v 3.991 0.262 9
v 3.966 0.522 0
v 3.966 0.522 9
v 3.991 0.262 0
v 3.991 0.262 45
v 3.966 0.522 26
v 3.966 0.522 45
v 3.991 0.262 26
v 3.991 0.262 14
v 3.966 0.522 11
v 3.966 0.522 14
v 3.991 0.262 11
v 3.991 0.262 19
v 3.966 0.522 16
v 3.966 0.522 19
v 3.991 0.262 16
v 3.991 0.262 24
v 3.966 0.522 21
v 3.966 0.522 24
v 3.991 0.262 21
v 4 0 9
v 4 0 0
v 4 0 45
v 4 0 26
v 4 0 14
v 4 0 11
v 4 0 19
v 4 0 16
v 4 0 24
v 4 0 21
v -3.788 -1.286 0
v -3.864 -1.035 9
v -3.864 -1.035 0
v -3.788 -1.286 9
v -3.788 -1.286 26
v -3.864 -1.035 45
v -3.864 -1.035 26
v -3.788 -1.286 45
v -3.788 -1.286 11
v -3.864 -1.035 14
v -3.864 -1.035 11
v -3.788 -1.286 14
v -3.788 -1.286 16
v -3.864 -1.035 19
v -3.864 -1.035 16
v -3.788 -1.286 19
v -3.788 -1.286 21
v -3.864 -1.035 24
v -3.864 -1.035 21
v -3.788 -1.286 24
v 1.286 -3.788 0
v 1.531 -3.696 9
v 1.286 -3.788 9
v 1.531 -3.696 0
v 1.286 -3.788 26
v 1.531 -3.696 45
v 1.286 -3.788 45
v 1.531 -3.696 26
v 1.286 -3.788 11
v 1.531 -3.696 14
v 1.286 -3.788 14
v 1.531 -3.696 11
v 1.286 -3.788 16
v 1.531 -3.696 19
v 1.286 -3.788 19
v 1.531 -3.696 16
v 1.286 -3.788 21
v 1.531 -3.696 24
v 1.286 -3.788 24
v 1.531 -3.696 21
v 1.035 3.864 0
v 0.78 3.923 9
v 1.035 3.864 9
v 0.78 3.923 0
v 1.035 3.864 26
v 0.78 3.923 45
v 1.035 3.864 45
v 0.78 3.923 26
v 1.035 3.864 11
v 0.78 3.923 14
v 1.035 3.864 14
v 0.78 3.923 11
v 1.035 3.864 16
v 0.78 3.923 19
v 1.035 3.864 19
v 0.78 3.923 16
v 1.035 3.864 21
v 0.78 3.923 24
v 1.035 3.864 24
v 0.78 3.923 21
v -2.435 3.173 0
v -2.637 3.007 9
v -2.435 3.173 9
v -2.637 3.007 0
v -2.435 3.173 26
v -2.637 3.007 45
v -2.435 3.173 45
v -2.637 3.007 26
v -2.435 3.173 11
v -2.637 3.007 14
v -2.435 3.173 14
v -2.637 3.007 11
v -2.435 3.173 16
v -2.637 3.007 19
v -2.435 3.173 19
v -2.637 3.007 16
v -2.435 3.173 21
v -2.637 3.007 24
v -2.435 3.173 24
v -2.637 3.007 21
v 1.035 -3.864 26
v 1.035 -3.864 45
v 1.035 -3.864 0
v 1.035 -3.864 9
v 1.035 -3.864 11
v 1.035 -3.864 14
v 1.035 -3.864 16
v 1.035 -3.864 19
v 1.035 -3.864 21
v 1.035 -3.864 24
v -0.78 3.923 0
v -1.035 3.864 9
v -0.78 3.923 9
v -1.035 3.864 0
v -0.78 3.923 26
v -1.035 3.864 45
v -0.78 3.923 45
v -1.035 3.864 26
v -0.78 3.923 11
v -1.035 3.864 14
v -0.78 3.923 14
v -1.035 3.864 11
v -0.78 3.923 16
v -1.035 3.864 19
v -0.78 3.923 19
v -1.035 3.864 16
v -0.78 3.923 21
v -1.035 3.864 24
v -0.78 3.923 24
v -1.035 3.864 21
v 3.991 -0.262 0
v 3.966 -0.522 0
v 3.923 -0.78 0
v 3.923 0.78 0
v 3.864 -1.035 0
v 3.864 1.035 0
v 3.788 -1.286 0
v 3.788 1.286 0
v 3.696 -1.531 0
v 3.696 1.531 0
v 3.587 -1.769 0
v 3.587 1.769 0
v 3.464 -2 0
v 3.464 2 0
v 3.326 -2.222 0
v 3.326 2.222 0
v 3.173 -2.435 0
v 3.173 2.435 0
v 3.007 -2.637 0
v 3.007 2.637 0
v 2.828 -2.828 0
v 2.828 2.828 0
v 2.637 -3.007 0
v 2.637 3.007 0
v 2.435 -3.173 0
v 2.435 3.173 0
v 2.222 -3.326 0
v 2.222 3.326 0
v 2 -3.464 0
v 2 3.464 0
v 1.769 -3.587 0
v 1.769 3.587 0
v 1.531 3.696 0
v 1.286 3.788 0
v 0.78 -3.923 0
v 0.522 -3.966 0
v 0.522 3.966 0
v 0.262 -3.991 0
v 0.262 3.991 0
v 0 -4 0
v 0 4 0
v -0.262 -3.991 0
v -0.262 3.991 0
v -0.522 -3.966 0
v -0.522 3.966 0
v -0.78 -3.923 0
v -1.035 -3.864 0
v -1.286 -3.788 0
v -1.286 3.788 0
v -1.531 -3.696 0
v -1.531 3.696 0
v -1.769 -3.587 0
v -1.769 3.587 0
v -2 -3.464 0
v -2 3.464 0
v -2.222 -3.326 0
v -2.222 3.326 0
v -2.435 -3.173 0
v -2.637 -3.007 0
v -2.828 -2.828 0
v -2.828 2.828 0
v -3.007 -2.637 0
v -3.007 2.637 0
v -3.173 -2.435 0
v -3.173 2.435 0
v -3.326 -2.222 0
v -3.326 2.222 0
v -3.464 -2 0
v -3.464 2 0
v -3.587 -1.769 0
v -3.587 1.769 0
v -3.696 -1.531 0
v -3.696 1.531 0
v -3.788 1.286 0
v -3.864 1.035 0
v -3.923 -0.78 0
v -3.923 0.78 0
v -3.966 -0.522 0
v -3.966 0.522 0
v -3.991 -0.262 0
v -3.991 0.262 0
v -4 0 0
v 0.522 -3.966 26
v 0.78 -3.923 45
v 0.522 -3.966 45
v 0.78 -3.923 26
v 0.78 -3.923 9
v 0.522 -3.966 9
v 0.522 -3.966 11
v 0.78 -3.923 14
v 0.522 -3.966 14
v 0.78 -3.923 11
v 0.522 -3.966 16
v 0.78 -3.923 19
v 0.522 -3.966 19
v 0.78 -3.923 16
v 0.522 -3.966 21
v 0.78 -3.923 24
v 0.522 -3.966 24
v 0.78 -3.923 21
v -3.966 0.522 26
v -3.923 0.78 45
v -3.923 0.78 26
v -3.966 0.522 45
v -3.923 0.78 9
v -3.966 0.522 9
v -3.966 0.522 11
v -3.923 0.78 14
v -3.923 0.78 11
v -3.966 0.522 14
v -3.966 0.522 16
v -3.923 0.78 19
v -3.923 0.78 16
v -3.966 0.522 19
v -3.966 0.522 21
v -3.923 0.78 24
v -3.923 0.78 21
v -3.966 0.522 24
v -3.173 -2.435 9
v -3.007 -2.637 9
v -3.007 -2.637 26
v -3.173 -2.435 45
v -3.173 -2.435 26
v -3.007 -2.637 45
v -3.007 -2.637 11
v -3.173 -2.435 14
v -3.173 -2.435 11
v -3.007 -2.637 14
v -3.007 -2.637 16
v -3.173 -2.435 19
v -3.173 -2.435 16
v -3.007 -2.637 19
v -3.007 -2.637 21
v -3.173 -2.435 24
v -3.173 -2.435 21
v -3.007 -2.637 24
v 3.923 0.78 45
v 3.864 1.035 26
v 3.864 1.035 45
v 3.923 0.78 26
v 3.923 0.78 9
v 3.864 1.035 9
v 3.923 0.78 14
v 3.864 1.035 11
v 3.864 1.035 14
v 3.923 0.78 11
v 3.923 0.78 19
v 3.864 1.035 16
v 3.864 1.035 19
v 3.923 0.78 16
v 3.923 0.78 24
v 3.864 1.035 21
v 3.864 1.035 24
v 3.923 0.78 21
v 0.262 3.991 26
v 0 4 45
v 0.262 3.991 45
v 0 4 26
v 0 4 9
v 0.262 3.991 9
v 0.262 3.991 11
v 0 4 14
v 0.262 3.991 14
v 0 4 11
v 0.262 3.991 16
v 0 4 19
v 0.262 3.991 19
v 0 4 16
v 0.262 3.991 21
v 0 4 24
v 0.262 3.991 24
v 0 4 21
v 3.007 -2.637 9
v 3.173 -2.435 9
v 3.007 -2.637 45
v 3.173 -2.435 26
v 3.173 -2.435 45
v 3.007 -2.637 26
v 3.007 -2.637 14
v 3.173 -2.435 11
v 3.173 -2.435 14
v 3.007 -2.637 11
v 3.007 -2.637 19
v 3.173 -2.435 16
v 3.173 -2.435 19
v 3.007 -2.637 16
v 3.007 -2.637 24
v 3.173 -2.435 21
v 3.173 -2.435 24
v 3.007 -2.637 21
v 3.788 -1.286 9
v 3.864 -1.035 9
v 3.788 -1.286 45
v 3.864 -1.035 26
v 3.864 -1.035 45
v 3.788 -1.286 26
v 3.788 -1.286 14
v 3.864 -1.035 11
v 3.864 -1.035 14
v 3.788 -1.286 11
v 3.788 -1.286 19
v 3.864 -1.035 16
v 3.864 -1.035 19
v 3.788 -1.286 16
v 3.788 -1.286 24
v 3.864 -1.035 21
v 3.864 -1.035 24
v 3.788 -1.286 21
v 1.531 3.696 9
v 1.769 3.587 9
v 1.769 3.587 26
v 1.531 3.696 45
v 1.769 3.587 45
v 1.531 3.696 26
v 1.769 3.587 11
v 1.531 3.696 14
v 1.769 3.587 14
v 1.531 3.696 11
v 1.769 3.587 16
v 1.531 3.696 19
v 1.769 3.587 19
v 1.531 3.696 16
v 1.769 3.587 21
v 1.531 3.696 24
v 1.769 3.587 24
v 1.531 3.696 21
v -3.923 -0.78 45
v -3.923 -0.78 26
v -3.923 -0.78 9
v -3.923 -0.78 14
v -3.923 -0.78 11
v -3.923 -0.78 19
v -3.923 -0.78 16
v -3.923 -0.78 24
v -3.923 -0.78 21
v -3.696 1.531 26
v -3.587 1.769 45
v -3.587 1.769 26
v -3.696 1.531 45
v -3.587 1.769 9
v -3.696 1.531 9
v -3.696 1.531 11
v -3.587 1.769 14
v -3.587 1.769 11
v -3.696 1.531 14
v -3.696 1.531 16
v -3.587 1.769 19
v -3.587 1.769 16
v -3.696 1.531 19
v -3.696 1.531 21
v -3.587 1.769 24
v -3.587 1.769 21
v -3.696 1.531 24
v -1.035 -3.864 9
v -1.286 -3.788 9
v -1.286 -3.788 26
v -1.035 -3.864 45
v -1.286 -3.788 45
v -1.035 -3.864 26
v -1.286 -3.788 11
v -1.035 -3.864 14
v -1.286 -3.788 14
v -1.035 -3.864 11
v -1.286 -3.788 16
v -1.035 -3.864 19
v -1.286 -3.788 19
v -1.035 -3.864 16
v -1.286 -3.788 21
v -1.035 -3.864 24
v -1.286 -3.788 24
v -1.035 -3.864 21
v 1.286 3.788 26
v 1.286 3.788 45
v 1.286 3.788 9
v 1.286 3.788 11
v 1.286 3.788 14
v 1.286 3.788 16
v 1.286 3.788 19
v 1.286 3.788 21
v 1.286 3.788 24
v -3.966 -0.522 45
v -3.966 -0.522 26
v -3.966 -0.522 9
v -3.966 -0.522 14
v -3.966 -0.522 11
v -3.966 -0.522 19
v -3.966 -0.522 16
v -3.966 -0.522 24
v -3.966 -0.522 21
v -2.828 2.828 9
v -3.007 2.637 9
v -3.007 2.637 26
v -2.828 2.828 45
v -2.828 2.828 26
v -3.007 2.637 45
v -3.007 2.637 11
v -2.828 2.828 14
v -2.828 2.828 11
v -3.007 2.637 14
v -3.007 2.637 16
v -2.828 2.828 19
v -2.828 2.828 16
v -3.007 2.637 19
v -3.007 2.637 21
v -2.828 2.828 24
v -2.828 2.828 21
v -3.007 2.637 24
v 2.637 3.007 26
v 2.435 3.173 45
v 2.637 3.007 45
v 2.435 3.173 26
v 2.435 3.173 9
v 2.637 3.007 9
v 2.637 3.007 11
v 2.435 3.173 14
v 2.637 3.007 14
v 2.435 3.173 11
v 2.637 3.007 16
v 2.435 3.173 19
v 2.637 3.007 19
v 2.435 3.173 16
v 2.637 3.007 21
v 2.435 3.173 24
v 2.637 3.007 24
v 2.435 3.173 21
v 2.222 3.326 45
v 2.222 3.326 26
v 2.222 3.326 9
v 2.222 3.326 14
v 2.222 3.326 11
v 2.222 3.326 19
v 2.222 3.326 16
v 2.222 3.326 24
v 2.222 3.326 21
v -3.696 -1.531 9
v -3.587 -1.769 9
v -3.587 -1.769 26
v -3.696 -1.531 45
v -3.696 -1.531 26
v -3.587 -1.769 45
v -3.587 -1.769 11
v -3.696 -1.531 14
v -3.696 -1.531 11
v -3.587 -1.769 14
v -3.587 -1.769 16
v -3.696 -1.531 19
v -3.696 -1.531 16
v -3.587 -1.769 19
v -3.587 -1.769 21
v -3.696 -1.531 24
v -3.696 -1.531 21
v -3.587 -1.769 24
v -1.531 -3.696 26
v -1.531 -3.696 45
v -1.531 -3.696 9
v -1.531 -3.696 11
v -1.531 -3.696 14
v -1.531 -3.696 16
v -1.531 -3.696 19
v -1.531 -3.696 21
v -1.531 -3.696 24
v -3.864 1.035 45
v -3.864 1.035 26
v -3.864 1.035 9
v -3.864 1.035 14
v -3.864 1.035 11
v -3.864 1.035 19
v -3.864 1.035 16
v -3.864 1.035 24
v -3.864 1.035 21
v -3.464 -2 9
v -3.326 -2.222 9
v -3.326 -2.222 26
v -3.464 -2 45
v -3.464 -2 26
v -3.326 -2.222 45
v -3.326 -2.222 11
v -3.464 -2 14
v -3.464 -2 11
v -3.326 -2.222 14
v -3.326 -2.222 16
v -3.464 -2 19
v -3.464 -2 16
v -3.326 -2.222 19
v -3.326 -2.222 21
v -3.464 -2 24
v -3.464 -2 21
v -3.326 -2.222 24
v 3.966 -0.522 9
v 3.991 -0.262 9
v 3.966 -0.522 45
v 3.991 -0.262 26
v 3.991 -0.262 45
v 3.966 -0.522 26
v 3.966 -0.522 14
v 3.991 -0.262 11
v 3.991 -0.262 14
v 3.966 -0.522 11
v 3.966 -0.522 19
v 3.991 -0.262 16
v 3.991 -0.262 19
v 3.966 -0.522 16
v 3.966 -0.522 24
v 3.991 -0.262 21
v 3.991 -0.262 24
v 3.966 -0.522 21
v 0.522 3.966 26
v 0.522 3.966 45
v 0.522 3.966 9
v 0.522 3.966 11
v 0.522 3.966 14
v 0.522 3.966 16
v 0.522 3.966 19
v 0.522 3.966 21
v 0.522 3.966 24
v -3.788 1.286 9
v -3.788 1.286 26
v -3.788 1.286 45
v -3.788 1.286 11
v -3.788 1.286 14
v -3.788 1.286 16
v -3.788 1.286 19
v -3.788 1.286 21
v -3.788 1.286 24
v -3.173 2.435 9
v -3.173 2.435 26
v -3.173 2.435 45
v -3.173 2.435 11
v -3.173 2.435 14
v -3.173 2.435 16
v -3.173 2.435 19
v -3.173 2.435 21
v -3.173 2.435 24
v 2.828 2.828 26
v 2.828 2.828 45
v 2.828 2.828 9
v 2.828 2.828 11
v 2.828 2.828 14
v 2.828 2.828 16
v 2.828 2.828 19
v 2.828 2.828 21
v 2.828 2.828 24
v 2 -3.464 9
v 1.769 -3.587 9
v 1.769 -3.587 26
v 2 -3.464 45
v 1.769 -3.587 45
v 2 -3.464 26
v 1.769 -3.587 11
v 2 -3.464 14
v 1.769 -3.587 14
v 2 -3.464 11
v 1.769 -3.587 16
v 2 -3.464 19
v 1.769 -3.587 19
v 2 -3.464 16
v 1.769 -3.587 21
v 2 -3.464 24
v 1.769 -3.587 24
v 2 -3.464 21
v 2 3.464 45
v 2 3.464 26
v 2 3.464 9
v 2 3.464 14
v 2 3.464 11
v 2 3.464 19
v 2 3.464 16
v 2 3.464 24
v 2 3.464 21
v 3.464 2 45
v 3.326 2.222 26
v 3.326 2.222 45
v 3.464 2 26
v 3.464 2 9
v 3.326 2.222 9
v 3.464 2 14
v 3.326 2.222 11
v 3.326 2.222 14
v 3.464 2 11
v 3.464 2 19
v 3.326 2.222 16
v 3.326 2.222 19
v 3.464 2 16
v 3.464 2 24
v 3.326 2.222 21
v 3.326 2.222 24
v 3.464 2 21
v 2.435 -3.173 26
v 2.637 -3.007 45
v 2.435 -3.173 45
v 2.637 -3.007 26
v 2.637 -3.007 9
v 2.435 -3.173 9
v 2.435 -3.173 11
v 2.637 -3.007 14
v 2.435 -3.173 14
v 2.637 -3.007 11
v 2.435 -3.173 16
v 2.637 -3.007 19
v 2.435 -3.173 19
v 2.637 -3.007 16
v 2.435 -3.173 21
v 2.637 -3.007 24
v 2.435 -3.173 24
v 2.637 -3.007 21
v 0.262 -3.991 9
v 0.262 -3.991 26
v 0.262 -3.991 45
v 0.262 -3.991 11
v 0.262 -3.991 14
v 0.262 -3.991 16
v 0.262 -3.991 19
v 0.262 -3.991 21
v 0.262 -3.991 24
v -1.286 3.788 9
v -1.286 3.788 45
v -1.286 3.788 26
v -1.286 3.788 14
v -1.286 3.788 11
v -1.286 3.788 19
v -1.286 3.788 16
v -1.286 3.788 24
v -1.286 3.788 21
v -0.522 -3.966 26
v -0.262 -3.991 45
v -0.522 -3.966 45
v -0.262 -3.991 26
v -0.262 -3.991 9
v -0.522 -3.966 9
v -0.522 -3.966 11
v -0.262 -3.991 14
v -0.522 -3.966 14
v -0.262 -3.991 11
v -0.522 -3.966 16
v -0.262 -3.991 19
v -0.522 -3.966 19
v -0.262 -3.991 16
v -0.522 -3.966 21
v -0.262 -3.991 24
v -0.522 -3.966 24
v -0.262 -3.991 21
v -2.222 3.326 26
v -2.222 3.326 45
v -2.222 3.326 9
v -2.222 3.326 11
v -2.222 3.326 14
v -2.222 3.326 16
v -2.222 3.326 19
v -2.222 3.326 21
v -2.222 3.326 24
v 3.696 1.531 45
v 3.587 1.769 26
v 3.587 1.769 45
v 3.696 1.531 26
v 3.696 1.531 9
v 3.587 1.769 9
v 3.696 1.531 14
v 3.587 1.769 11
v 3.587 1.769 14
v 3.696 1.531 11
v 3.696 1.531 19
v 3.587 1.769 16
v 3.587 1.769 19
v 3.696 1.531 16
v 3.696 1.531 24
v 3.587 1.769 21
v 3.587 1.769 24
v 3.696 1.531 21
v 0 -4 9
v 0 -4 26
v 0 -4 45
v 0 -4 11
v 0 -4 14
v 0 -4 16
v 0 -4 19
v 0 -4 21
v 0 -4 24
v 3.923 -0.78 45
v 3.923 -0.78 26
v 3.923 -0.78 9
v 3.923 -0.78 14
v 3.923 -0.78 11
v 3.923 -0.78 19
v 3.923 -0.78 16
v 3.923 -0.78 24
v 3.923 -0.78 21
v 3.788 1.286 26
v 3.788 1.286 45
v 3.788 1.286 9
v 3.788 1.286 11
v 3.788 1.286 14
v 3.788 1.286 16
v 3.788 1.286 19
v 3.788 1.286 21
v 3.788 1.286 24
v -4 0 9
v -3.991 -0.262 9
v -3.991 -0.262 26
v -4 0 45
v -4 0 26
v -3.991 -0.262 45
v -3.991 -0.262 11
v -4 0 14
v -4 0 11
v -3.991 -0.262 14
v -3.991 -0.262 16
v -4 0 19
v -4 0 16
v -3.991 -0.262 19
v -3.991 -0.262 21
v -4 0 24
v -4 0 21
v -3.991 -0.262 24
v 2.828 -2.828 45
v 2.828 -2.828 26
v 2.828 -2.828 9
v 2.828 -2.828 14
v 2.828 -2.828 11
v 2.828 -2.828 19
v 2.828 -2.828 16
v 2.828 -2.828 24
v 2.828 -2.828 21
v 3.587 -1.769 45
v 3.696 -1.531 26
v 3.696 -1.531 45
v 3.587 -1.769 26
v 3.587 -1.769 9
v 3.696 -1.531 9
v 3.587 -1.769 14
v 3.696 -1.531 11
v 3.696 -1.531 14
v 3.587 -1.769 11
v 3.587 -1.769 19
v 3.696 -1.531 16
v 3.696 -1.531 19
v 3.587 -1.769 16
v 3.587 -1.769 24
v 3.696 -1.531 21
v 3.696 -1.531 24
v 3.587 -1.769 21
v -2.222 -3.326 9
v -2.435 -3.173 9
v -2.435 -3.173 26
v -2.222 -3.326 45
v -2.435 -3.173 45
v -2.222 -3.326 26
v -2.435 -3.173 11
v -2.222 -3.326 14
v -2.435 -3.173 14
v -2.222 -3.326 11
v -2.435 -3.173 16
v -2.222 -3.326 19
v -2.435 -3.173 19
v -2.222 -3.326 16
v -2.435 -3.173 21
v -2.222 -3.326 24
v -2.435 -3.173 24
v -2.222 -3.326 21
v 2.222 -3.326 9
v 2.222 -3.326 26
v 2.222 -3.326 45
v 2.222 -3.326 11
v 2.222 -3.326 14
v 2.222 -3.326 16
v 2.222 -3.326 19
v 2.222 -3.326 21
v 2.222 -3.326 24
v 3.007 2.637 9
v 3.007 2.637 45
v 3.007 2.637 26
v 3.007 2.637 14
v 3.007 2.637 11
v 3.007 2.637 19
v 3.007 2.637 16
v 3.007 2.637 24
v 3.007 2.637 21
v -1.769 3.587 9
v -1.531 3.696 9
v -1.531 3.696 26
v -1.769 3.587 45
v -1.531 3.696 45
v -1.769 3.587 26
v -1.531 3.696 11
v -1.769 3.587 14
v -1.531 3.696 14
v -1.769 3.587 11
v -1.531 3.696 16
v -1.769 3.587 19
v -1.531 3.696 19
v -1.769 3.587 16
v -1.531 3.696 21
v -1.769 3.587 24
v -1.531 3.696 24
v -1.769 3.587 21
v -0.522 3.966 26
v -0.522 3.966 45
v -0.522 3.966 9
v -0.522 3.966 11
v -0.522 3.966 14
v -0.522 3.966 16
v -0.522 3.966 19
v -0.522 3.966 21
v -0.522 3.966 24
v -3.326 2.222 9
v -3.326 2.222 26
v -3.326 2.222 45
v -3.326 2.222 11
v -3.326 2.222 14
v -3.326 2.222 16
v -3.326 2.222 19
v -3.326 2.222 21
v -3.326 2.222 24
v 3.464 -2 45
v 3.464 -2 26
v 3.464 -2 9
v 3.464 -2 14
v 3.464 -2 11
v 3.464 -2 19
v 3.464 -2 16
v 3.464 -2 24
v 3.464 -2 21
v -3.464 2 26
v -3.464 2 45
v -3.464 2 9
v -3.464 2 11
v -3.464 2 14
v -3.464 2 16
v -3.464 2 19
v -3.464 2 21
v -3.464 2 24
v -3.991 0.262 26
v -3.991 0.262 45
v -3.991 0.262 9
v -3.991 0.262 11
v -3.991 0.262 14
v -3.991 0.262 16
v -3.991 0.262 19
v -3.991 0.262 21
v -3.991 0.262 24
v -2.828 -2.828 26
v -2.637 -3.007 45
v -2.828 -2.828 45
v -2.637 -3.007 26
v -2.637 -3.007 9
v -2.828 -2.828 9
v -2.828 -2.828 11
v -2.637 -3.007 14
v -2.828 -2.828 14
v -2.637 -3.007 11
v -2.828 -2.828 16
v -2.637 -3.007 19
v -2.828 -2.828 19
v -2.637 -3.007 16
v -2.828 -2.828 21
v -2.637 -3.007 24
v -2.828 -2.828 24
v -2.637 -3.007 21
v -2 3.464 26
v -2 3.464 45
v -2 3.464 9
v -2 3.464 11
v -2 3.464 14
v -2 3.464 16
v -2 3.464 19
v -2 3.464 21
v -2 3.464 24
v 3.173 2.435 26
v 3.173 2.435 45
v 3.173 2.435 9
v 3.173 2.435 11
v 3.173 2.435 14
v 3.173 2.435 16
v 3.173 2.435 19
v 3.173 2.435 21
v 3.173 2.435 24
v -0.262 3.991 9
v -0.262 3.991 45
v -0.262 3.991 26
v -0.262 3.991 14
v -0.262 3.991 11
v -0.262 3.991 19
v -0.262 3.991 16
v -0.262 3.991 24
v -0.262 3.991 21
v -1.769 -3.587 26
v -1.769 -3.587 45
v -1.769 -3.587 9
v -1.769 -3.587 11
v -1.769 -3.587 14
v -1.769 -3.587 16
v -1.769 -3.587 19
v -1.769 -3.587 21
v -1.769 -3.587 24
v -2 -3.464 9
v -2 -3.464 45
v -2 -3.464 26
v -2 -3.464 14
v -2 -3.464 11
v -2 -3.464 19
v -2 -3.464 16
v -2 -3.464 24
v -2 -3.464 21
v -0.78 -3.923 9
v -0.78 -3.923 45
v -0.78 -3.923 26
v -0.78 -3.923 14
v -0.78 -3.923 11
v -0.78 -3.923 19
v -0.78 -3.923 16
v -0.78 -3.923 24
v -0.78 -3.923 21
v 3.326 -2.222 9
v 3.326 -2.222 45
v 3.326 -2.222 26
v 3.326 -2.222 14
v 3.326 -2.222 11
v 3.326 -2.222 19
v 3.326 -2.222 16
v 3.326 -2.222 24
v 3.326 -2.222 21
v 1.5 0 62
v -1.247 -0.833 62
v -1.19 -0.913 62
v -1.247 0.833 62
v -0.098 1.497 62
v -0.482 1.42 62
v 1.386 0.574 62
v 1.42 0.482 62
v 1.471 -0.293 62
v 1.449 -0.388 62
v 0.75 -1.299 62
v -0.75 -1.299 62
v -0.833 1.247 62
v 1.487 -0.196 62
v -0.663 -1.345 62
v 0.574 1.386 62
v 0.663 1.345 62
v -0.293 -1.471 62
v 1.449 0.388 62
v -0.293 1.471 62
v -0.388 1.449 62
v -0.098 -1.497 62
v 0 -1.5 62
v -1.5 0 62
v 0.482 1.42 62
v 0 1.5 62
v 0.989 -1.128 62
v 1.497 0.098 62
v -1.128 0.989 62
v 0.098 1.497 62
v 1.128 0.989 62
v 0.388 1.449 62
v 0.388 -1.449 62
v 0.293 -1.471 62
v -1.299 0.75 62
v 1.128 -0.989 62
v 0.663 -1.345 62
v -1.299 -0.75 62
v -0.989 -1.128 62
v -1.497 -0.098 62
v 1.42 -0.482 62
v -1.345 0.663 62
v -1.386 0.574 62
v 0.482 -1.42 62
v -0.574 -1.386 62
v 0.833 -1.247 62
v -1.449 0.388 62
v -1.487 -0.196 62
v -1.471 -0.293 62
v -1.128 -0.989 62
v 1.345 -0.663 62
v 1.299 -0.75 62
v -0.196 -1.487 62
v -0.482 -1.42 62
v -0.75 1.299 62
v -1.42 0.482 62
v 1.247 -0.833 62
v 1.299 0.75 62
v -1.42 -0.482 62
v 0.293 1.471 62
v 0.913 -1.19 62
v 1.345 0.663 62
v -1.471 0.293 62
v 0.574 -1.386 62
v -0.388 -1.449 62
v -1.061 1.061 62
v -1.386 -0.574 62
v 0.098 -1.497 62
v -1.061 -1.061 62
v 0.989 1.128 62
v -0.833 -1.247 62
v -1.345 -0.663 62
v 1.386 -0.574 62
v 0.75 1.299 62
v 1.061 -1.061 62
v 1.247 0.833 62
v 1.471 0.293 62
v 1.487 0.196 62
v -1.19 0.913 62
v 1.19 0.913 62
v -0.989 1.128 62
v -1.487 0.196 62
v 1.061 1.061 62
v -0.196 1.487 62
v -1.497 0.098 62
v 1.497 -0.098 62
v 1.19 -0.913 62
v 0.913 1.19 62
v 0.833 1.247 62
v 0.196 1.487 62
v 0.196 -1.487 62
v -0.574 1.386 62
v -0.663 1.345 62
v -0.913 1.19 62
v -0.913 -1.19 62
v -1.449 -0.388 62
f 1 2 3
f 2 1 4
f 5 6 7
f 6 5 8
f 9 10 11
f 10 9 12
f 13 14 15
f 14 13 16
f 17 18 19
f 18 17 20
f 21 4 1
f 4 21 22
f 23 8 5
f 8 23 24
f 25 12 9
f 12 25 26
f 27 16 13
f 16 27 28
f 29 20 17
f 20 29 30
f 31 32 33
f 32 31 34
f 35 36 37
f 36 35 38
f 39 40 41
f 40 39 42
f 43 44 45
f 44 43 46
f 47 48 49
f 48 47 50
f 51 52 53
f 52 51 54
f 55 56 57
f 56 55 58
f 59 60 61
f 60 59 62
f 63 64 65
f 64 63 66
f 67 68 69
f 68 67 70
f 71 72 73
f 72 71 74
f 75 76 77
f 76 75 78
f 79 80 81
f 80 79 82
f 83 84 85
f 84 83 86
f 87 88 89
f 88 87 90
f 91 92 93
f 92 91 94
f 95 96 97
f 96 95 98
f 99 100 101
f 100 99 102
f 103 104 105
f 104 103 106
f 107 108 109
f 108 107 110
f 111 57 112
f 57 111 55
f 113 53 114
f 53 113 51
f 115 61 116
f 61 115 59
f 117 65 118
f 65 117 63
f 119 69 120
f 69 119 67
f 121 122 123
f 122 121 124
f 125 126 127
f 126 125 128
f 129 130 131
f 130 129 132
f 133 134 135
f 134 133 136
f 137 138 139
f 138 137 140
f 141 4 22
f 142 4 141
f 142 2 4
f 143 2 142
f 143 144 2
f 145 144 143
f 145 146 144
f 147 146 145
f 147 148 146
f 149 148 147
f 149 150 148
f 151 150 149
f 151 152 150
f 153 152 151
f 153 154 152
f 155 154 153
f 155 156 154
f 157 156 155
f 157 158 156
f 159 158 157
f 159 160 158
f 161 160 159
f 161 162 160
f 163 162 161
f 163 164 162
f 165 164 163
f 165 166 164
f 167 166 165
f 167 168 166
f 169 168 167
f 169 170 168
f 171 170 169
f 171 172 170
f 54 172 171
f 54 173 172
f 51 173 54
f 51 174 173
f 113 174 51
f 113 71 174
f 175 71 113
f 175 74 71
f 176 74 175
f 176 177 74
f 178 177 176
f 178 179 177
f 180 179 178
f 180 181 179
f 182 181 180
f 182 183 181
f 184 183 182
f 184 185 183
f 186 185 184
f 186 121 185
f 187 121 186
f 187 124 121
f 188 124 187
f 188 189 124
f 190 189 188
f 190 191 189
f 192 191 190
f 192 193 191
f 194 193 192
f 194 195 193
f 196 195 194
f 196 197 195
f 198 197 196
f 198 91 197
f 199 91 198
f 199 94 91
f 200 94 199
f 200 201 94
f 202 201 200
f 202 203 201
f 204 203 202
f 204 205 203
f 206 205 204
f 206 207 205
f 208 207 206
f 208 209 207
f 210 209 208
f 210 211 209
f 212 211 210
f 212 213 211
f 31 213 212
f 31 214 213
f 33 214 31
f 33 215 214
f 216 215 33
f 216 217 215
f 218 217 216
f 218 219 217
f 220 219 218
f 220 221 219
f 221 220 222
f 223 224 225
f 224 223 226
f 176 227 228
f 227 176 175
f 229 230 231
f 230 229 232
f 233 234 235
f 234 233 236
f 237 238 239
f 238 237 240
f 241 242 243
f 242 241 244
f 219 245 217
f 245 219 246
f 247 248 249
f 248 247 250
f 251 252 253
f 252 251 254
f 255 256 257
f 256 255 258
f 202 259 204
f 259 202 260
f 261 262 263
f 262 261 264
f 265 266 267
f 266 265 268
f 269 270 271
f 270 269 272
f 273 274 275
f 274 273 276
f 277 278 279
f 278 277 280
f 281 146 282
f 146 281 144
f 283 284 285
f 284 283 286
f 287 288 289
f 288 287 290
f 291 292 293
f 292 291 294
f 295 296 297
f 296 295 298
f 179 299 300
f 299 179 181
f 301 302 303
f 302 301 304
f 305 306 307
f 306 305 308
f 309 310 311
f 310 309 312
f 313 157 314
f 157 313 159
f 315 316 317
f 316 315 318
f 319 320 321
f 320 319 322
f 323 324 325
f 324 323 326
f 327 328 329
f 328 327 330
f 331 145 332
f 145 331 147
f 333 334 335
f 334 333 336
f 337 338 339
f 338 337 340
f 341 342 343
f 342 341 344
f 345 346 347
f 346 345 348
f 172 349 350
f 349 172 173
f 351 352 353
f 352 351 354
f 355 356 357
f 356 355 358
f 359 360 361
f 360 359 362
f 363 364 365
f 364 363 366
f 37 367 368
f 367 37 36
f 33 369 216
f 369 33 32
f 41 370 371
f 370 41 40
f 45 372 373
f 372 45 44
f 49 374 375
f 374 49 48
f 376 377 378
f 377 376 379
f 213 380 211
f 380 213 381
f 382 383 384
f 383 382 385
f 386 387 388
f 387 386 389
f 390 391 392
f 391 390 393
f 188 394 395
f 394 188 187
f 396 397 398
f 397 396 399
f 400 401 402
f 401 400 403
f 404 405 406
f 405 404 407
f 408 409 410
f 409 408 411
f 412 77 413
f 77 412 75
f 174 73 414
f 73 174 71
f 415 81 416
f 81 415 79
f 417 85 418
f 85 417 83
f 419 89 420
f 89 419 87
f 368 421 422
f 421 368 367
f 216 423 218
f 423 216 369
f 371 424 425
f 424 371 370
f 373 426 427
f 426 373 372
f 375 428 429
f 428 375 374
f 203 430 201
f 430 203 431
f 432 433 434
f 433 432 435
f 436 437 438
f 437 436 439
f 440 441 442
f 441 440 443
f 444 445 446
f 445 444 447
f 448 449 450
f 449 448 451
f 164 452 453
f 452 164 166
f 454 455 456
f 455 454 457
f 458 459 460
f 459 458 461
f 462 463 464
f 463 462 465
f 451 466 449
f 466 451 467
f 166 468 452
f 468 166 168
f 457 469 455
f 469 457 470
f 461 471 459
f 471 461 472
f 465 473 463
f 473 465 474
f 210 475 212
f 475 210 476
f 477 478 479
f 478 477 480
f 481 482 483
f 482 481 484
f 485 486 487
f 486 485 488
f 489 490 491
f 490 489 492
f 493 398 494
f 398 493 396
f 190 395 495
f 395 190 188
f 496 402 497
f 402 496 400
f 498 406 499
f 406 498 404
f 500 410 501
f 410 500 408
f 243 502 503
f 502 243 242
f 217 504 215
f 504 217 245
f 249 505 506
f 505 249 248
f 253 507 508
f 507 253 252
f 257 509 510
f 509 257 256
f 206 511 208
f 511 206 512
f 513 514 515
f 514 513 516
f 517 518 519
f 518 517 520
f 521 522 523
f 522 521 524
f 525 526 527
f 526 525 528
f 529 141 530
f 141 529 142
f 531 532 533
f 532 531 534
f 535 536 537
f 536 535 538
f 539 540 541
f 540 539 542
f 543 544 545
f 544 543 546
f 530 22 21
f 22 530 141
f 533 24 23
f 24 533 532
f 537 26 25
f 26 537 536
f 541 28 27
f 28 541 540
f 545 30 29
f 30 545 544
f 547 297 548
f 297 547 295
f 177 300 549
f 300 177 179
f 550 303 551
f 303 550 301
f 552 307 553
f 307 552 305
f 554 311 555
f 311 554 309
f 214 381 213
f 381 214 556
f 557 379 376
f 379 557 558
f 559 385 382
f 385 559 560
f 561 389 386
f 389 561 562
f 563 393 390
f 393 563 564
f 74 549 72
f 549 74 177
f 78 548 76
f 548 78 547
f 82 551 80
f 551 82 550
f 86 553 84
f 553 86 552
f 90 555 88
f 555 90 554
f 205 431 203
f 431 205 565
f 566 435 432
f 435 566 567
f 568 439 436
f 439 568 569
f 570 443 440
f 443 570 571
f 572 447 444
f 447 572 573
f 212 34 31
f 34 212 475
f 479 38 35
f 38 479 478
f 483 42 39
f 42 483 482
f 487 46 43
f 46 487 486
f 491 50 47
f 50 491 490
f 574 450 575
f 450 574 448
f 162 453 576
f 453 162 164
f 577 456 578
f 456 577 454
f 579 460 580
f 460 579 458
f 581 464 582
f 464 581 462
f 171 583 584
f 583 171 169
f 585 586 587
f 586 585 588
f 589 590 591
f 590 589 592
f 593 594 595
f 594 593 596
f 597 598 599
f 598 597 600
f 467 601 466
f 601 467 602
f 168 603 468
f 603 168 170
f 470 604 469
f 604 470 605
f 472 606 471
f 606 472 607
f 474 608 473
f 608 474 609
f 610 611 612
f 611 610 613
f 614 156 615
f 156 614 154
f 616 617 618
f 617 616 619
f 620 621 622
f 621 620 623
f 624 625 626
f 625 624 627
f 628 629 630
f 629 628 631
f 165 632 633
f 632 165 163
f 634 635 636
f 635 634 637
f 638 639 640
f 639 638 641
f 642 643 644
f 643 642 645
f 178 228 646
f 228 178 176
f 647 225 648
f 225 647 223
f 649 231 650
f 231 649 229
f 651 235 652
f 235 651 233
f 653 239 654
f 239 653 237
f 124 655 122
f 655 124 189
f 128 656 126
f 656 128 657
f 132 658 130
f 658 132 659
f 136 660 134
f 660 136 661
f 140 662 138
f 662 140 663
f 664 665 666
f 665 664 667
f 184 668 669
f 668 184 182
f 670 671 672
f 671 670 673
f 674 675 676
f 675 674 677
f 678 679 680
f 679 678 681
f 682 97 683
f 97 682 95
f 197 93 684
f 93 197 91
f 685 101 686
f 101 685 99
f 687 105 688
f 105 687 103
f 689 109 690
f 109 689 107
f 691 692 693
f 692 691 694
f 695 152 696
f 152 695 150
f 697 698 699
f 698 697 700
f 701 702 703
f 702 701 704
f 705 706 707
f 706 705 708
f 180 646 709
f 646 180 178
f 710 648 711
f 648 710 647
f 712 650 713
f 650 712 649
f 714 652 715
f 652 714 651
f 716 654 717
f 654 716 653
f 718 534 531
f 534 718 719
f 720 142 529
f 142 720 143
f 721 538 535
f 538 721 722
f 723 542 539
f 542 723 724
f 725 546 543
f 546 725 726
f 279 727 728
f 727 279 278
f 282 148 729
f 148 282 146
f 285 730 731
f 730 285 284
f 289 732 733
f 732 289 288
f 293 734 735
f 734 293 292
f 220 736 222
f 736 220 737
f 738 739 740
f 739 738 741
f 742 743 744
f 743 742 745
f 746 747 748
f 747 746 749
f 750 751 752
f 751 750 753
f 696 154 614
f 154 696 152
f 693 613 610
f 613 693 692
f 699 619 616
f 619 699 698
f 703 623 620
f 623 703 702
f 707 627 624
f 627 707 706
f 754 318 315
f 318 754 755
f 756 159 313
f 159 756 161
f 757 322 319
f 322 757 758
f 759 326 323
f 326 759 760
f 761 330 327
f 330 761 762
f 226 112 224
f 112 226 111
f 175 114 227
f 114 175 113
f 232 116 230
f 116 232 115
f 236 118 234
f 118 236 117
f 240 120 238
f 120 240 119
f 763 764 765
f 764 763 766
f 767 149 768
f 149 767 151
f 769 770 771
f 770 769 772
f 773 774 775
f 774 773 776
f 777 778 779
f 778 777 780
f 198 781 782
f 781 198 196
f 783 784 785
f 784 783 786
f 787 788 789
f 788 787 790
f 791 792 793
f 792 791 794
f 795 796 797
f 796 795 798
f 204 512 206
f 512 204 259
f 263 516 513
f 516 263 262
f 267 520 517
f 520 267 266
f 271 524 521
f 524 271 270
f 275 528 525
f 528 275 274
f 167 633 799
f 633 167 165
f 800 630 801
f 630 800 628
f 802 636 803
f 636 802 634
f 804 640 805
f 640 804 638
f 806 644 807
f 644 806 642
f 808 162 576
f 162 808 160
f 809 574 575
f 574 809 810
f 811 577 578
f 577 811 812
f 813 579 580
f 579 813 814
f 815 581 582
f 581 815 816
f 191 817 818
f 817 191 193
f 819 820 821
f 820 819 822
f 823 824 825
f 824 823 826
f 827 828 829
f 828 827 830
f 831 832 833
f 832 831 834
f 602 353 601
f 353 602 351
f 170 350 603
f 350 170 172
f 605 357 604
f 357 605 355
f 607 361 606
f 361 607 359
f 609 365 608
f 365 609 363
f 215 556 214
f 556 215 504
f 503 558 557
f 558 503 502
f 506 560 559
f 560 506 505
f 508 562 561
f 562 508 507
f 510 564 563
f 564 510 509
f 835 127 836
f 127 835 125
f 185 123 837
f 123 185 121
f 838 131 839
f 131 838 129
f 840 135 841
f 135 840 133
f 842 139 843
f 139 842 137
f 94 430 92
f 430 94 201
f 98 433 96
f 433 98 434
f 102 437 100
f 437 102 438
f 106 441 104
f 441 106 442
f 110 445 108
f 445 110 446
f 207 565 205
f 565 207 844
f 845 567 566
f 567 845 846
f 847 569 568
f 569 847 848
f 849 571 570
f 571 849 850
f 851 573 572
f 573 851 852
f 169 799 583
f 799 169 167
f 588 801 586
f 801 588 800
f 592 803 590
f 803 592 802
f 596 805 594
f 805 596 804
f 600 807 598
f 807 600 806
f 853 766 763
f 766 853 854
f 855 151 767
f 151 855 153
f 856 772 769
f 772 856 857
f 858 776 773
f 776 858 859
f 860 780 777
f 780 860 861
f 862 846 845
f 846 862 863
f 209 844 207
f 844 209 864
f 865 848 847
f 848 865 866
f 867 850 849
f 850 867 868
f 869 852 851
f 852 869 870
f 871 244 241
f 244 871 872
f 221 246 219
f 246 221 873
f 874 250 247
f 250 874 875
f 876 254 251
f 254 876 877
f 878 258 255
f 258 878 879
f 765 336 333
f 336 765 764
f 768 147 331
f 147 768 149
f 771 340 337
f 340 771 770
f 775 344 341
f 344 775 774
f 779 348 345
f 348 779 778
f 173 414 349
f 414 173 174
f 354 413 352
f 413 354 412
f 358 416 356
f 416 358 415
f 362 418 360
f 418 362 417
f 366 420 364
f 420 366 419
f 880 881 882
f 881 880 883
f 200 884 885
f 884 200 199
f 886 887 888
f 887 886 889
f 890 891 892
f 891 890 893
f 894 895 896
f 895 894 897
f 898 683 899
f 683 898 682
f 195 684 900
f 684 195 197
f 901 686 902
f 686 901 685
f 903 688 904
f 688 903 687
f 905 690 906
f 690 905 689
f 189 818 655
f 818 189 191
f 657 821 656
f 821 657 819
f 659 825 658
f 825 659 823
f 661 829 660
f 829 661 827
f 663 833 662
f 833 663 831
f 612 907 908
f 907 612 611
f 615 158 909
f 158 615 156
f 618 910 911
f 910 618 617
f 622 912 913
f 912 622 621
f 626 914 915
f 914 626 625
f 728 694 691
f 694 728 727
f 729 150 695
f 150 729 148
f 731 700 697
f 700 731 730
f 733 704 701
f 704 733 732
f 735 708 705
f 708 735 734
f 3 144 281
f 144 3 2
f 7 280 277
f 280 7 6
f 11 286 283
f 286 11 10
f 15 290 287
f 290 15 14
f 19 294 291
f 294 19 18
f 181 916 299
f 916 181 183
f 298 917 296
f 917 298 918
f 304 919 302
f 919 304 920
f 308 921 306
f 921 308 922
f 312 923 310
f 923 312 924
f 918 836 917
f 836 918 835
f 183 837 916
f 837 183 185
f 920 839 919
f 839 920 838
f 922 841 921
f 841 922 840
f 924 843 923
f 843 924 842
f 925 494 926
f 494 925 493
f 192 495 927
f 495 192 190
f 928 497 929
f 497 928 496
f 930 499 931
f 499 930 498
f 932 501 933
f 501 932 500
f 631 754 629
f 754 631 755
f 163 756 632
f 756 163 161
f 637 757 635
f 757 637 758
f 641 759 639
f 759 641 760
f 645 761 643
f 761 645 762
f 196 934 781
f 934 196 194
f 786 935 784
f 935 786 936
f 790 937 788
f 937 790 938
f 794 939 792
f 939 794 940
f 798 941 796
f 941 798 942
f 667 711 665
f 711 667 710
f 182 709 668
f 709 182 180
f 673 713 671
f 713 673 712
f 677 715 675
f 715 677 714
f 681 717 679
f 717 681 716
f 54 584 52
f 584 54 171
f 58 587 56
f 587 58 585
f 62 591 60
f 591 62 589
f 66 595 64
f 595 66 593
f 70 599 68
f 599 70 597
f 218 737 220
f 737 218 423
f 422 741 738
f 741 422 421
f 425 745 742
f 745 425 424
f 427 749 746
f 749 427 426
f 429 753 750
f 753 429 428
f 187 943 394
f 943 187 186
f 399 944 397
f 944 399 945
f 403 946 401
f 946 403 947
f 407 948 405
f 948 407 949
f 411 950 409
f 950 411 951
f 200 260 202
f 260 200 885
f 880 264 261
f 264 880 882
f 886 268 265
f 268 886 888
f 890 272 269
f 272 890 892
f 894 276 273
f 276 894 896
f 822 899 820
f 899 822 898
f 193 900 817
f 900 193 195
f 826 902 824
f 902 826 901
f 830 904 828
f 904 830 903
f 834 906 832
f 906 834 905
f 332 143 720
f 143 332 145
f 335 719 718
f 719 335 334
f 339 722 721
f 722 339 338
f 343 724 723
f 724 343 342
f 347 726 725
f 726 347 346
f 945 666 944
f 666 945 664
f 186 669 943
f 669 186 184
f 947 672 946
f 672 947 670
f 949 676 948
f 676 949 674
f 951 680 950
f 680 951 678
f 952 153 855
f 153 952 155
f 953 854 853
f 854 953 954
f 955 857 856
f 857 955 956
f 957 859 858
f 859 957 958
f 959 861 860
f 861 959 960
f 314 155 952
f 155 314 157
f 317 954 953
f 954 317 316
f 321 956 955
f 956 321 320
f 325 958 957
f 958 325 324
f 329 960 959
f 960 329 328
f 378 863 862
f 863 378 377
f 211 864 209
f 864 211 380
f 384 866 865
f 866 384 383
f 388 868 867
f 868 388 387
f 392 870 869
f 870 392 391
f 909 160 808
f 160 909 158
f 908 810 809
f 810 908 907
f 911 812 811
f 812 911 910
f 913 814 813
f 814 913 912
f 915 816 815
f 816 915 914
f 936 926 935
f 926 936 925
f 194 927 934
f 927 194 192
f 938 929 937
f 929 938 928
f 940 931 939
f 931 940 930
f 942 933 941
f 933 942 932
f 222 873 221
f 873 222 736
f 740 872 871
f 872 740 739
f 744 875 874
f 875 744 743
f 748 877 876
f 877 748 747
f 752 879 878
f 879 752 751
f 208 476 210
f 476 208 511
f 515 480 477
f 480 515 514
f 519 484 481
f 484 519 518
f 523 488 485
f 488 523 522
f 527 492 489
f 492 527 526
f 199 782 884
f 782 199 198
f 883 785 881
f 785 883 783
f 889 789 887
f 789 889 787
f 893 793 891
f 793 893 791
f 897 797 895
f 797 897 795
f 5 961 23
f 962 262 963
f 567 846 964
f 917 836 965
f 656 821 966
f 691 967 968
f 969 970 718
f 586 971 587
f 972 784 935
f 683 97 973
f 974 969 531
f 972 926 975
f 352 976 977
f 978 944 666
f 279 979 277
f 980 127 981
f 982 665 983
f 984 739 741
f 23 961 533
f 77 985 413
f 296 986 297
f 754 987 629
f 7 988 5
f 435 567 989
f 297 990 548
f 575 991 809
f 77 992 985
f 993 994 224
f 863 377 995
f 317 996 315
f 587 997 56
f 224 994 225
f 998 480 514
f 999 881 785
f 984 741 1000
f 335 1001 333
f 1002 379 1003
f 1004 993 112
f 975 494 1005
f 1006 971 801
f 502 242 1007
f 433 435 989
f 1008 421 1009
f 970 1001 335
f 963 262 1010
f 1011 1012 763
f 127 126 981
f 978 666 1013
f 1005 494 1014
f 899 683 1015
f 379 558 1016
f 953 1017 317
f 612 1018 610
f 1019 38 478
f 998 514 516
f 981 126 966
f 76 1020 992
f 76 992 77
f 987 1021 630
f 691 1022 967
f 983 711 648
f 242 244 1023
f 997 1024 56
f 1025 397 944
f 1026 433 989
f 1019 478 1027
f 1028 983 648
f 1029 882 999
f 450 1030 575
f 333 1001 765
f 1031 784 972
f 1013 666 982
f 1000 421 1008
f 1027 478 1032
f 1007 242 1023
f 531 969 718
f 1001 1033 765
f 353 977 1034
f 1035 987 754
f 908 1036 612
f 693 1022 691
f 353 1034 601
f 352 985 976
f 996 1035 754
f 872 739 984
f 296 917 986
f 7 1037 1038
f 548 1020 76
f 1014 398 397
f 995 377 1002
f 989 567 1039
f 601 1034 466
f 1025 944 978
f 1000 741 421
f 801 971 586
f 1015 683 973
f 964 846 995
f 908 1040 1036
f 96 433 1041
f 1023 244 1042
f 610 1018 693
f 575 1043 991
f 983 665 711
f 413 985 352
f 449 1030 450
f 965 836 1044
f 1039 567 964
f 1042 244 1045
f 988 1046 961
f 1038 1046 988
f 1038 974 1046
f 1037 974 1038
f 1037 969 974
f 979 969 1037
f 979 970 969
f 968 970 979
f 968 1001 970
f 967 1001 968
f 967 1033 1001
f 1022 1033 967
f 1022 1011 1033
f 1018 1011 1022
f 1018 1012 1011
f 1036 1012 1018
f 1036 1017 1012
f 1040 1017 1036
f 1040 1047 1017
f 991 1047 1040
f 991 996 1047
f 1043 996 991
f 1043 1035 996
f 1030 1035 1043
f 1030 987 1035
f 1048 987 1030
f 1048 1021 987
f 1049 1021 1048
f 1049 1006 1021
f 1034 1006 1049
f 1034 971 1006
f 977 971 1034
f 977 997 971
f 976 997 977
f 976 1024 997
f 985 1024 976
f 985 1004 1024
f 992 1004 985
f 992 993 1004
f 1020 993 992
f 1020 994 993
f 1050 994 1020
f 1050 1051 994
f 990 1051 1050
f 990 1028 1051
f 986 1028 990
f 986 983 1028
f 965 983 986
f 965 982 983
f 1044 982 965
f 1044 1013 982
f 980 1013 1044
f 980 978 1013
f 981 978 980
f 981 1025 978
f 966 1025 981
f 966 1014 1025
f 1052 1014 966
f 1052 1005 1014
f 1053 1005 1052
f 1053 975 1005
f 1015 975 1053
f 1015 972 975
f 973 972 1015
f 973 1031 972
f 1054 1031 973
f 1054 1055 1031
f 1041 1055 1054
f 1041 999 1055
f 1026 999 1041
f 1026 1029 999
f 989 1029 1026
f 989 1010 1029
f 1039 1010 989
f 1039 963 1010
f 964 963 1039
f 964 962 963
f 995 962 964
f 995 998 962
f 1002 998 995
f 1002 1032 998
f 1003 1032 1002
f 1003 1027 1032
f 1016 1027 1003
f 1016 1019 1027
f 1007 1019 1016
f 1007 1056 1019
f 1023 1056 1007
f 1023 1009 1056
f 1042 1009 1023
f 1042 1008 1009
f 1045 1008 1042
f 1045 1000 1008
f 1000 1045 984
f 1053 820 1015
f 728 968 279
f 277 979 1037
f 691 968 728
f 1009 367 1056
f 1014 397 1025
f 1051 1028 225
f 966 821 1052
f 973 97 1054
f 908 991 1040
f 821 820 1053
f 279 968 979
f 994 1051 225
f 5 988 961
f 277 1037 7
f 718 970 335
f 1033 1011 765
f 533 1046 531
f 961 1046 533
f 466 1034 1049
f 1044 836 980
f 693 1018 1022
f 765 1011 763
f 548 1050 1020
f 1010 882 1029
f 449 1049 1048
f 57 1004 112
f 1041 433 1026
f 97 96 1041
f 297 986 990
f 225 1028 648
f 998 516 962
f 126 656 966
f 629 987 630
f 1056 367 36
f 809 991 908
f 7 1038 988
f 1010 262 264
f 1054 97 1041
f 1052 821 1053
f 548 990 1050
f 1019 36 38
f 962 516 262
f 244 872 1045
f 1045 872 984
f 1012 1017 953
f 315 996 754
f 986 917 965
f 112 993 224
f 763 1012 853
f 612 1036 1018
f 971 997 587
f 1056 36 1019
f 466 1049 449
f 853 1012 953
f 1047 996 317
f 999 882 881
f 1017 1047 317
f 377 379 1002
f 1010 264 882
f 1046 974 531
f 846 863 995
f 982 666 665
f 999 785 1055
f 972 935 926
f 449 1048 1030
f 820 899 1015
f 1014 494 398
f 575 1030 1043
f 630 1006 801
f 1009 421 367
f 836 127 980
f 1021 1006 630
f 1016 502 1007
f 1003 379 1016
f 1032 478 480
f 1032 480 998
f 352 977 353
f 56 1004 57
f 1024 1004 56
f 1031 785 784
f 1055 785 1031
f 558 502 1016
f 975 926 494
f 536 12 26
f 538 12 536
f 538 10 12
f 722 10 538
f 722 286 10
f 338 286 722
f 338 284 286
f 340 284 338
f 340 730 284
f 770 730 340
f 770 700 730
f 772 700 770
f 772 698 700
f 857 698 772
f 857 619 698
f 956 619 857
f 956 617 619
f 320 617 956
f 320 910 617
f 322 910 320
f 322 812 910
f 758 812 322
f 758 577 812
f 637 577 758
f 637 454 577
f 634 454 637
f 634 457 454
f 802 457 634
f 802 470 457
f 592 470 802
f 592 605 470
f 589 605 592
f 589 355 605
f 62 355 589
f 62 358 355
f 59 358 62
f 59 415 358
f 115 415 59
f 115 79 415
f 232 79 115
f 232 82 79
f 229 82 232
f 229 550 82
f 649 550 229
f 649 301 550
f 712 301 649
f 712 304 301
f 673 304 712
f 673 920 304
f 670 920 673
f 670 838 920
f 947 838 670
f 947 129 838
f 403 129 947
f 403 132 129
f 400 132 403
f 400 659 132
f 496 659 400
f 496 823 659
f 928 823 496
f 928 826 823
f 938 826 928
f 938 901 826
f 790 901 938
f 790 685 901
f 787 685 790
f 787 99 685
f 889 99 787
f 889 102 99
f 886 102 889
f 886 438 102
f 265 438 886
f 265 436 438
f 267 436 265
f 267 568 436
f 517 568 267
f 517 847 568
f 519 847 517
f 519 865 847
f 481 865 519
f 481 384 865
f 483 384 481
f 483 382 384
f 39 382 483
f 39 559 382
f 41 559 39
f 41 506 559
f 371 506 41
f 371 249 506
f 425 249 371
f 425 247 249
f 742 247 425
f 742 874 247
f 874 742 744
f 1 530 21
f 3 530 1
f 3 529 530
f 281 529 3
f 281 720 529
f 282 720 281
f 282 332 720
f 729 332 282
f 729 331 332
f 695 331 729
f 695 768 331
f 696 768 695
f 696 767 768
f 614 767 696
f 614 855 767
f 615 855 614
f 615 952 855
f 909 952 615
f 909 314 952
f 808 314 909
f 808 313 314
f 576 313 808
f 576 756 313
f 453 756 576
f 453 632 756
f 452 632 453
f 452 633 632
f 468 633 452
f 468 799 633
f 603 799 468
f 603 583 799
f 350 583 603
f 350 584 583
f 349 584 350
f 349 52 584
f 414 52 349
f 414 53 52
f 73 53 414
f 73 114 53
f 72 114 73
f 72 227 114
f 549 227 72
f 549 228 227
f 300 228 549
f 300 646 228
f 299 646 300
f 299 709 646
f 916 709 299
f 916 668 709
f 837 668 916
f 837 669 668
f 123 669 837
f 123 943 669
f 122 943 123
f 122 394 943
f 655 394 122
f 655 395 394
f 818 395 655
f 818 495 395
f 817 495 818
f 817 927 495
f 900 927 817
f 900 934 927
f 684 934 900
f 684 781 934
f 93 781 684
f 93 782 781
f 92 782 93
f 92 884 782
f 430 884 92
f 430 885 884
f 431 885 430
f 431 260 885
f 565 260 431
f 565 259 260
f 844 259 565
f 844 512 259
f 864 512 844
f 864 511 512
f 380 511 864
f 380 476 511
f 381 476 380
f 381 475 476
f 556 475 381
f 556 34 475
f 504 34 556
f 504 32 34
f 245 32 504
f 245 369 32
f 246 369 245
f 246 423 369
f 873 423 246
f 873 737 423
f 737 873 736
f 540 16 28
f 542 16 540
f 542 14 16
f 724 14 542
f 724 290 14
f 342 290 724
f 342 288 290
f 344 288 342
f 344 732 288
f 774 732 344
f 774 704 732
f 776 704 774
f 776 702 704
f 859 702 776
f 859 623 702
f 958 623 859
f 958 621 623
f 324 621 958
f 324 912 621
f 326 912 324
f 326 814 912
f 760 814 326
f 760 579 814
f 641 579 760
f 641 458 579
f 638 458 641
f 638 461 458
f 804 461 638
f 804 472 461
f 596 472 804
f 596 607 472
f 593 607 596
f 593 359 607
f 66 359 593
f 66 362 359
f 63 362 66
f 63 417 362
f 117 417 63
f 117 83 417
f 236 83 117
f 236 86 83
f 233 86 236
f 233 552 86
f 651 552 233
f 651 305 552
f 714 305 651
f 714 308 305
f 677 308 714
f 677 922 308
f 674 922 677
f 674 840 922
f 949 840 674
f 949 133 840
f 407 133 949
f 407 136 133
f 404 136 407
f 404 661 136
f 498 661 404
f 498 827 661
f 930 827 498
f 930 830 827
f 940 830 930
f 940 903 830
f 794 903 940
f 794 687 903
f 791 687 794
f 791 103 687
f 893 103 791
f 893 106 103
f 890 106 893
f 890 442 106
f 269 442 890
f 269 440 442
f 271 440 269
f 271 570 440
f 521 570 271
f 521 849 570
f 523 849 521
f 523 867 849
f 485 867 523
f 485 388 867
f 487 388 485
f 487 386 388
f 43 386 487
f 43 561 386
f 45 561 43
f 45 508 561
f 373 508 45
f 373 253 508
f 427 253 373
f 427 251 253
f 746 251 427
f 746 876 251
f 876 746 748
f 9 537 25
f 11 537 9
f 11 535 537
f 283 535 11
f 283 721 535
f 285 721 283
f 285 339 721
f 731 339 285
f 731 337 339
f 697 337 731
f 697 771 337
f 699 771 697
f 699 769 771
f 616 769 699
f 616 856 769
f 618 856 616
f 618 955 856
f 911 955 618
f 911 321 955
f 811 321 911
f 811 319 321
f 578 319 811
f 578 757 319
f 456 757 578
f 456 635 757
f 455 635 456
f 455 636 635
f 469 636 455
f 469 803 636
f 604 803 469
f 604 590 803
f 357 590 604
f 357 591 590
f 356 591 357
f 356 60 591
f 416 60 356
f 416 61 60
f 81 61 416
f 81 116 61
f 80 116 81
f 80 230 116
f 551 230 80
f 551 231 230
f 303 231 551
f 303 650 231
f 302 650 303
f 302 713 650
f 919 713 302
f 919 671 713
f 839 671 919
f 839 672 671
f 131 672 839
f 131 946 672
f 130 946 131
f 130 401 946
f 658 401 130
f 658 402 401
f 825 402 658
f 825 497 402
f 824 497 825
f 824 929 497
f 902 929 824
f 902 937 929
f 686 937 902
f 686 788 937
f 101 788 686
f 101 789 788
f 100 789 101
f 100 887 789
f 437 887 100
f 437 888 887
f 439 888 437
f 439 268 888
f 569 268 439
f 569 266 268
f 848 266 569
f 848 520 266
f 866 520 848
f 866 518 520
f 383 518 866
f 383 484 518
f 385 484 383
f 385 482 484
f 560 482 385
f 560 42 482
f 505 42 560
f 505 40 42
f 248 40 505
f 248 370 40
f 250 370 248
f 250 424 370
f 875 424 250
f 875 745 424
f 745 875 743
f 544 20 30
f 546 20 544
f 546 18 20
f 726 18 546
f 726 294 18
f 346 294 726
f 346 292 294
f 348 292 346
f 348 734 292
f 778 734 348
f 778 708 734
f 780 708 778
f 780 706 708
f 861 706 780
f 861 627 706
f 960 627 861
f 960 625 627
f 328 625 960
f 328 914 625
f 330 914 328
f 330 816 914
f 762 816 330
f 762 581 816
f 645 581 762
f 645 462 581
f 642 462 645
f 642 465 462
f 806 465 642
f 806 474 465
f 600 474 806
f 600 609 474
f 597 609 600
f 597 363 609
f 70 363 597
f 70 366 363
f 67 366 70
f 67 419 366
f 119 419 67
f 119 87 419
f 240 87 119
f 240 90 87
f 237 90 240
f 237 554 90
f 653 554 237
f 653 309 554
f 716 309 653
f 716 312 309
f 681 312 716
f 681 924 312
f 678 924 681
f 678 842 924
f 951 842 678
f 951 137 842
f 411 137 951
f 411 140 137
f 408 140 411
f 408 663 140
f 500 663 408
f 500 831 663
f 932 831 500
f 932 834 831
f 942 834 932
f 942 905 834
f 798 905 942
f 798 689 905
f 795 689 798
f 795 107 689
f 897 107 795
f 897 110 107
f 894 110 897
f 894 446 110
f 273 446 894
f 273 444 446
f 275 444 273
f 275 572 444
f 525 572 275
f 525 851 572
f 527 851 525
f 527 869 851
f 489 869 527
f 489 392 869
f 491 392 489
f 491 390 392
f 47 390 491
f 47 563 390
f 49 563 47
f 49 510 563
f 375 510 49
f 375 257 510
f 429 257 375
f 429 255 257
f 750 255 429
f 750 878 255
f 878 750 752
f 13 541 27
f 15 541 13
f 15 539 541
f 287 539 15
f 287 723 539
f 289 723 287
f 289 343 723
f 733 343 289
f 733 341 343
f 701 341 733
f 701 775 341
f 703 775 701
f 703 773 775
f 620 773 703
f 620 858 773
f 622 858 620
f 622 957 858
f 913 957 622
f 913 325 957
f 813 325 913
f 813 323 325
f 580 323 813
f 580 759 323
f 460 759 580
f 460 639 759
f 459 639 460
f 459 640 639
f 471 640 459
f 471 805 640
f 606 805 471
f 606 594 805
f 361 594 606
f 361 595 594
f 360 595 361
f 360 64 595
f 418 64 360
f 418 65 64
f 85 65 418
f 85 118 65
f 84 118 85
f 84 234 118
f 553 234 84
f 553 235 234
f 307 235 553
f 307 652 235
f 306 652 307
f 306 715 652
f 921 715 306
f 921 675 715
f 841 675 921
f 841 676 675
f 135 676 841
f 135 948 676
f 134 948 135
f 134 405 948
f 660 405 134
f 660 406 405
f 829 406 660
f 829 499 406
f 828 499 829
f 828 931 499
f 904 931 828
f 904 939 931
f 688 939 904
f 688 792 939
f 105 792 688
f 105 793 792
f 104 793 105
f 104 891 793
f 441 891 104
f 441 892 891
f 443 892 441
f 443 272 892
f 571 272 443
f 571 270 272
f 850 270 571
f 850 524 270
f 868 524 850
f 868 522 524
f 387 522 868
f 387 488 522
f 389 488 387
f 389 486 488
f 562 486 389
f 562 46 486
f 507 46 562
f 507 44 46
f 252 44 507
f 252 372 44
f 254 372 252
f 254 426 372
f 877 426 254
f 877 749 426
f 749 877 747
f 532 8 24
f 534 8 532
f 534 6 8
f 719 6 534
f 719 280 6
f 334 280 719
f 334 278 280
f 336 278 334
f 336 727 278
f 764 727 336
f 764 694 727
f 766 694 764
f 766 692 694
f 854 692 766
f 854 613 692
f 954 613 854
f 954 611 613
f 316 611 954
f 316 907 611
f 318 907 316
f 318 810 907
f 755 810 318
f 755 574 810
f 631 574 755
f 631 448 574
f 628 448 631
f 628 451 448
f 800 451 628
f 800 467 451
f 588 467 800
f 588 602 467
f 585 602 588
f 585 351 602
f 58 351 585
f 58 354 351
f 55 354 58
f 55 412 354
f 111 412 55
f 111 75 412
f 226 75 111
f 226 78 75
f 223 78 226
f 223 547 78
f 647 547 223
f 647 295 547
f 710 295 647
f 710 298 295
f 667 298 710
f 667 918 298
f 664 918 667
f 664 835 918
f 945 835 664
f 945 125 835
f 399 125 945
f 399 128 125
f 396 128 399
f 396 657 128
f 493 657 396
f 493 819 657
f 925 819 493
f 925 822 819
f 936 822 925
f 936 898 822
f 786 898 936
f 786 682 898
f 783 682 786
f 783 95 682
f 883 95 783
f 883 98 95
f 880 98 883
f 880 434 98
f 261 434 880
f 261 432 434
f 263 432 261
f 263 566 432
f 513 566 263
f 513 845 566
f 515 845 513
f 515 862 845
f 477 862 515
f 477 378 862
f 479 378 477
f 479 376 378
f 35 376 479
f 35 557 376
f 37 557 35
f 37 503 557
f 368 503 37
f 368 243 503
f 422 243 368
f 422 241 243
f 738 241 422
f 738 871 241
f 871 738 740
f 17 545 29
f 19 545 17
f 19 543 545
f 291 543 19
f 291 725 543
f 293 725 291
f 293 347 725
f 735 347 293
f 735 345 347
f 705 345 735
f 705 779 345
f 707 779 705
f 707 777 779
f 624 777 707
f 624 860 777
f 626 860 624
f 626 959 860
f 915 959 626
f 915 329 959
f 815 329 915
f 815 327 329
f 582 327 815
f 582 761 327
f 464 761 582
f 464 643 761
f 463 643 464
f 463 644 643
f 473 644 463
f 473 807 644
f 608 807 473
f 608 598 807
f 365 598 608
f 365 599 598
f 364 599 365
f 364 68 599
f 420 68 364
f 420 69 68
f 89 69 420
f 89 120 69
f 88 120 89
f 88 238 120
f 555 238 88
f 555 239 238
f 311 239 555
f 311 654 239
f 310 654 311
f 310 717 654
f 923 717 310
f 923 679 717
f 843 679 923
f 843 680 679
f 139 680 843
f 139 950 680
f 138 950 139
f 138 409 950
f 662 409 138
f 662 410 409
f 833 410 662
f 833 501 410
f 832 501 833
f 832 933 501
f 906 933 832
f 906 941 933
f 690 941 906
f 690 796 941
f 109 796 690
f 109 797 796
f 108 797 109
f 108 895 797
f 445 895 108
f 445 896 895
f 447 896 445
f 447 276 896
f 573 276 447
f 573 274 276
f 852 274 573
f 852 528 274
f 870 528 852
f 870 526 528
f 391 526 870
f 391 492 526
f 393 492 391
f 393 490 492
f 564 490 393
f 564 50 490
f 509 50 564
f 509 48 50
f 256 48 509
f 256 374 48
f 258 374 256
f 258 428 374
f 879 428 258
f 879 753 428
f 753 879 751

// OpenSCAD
// Pestle for grinding tissue inside a 1.5 mL microcentrifuge tube
// Printed standing upright: handle at the bottom, tip at the top.

// ---------------- Parameters ----------------
handle_d      = 8;    // handle diameter (mm), z = 0 to 45
handle_h      = 45;   // handle height (mm)
cone_top_d    = 8;    // cone diameter at top of handle (mm)
cone_bottom_d = 3;    // cone diameter at z = 62 (mm)
cone_top_z    = 45;   // cone top height (mm)
sphere_d      = 3;    // tip sphere diameter (mm)
sphere_cz     = 62;   // tip sphere centre height (mm)
groove_count  = 4;    // number of circumferential grooves
groove_w      = 2;    // groove width (mm), in Z
groove_depth  = 1;    // groove depth (mm)
groove_z      = [10, 15, 20, 25]; // groove centre heights (mm)
eps           = 0.5;  // cutter overshoot past faces (mm)

$fn = 96;             // curve resolution

// ---------------- Model ----------------
difference() {
    union() {
        // (1) Cylindrical handle
        cylinder(d = handle_d, h = handle_h);

        // (2) Tapering cone: 8 mm at z = 45 to 3 mm at z = 62
        translate([0, 0, cone_top_z])
            cylinder(d1 = cone_top_d, d2 = cone_bottom_d, h = sphere_cz - cone_top_z);

        // (3) Rounded tip: 3 mm sphere centred at z = 62
        translate([0, 0, sphere_cz - sphere_d / 2])
            sphere(d = sphere_d);
    }

    // Grip grooves, cut through the full height of the handle
    for (z = groove_z)
        translate([0, 0, z - groove_w / 2])
            cylinder(d = handle_d + 2 * eps, h = groove_w, $fn = 96);
}
